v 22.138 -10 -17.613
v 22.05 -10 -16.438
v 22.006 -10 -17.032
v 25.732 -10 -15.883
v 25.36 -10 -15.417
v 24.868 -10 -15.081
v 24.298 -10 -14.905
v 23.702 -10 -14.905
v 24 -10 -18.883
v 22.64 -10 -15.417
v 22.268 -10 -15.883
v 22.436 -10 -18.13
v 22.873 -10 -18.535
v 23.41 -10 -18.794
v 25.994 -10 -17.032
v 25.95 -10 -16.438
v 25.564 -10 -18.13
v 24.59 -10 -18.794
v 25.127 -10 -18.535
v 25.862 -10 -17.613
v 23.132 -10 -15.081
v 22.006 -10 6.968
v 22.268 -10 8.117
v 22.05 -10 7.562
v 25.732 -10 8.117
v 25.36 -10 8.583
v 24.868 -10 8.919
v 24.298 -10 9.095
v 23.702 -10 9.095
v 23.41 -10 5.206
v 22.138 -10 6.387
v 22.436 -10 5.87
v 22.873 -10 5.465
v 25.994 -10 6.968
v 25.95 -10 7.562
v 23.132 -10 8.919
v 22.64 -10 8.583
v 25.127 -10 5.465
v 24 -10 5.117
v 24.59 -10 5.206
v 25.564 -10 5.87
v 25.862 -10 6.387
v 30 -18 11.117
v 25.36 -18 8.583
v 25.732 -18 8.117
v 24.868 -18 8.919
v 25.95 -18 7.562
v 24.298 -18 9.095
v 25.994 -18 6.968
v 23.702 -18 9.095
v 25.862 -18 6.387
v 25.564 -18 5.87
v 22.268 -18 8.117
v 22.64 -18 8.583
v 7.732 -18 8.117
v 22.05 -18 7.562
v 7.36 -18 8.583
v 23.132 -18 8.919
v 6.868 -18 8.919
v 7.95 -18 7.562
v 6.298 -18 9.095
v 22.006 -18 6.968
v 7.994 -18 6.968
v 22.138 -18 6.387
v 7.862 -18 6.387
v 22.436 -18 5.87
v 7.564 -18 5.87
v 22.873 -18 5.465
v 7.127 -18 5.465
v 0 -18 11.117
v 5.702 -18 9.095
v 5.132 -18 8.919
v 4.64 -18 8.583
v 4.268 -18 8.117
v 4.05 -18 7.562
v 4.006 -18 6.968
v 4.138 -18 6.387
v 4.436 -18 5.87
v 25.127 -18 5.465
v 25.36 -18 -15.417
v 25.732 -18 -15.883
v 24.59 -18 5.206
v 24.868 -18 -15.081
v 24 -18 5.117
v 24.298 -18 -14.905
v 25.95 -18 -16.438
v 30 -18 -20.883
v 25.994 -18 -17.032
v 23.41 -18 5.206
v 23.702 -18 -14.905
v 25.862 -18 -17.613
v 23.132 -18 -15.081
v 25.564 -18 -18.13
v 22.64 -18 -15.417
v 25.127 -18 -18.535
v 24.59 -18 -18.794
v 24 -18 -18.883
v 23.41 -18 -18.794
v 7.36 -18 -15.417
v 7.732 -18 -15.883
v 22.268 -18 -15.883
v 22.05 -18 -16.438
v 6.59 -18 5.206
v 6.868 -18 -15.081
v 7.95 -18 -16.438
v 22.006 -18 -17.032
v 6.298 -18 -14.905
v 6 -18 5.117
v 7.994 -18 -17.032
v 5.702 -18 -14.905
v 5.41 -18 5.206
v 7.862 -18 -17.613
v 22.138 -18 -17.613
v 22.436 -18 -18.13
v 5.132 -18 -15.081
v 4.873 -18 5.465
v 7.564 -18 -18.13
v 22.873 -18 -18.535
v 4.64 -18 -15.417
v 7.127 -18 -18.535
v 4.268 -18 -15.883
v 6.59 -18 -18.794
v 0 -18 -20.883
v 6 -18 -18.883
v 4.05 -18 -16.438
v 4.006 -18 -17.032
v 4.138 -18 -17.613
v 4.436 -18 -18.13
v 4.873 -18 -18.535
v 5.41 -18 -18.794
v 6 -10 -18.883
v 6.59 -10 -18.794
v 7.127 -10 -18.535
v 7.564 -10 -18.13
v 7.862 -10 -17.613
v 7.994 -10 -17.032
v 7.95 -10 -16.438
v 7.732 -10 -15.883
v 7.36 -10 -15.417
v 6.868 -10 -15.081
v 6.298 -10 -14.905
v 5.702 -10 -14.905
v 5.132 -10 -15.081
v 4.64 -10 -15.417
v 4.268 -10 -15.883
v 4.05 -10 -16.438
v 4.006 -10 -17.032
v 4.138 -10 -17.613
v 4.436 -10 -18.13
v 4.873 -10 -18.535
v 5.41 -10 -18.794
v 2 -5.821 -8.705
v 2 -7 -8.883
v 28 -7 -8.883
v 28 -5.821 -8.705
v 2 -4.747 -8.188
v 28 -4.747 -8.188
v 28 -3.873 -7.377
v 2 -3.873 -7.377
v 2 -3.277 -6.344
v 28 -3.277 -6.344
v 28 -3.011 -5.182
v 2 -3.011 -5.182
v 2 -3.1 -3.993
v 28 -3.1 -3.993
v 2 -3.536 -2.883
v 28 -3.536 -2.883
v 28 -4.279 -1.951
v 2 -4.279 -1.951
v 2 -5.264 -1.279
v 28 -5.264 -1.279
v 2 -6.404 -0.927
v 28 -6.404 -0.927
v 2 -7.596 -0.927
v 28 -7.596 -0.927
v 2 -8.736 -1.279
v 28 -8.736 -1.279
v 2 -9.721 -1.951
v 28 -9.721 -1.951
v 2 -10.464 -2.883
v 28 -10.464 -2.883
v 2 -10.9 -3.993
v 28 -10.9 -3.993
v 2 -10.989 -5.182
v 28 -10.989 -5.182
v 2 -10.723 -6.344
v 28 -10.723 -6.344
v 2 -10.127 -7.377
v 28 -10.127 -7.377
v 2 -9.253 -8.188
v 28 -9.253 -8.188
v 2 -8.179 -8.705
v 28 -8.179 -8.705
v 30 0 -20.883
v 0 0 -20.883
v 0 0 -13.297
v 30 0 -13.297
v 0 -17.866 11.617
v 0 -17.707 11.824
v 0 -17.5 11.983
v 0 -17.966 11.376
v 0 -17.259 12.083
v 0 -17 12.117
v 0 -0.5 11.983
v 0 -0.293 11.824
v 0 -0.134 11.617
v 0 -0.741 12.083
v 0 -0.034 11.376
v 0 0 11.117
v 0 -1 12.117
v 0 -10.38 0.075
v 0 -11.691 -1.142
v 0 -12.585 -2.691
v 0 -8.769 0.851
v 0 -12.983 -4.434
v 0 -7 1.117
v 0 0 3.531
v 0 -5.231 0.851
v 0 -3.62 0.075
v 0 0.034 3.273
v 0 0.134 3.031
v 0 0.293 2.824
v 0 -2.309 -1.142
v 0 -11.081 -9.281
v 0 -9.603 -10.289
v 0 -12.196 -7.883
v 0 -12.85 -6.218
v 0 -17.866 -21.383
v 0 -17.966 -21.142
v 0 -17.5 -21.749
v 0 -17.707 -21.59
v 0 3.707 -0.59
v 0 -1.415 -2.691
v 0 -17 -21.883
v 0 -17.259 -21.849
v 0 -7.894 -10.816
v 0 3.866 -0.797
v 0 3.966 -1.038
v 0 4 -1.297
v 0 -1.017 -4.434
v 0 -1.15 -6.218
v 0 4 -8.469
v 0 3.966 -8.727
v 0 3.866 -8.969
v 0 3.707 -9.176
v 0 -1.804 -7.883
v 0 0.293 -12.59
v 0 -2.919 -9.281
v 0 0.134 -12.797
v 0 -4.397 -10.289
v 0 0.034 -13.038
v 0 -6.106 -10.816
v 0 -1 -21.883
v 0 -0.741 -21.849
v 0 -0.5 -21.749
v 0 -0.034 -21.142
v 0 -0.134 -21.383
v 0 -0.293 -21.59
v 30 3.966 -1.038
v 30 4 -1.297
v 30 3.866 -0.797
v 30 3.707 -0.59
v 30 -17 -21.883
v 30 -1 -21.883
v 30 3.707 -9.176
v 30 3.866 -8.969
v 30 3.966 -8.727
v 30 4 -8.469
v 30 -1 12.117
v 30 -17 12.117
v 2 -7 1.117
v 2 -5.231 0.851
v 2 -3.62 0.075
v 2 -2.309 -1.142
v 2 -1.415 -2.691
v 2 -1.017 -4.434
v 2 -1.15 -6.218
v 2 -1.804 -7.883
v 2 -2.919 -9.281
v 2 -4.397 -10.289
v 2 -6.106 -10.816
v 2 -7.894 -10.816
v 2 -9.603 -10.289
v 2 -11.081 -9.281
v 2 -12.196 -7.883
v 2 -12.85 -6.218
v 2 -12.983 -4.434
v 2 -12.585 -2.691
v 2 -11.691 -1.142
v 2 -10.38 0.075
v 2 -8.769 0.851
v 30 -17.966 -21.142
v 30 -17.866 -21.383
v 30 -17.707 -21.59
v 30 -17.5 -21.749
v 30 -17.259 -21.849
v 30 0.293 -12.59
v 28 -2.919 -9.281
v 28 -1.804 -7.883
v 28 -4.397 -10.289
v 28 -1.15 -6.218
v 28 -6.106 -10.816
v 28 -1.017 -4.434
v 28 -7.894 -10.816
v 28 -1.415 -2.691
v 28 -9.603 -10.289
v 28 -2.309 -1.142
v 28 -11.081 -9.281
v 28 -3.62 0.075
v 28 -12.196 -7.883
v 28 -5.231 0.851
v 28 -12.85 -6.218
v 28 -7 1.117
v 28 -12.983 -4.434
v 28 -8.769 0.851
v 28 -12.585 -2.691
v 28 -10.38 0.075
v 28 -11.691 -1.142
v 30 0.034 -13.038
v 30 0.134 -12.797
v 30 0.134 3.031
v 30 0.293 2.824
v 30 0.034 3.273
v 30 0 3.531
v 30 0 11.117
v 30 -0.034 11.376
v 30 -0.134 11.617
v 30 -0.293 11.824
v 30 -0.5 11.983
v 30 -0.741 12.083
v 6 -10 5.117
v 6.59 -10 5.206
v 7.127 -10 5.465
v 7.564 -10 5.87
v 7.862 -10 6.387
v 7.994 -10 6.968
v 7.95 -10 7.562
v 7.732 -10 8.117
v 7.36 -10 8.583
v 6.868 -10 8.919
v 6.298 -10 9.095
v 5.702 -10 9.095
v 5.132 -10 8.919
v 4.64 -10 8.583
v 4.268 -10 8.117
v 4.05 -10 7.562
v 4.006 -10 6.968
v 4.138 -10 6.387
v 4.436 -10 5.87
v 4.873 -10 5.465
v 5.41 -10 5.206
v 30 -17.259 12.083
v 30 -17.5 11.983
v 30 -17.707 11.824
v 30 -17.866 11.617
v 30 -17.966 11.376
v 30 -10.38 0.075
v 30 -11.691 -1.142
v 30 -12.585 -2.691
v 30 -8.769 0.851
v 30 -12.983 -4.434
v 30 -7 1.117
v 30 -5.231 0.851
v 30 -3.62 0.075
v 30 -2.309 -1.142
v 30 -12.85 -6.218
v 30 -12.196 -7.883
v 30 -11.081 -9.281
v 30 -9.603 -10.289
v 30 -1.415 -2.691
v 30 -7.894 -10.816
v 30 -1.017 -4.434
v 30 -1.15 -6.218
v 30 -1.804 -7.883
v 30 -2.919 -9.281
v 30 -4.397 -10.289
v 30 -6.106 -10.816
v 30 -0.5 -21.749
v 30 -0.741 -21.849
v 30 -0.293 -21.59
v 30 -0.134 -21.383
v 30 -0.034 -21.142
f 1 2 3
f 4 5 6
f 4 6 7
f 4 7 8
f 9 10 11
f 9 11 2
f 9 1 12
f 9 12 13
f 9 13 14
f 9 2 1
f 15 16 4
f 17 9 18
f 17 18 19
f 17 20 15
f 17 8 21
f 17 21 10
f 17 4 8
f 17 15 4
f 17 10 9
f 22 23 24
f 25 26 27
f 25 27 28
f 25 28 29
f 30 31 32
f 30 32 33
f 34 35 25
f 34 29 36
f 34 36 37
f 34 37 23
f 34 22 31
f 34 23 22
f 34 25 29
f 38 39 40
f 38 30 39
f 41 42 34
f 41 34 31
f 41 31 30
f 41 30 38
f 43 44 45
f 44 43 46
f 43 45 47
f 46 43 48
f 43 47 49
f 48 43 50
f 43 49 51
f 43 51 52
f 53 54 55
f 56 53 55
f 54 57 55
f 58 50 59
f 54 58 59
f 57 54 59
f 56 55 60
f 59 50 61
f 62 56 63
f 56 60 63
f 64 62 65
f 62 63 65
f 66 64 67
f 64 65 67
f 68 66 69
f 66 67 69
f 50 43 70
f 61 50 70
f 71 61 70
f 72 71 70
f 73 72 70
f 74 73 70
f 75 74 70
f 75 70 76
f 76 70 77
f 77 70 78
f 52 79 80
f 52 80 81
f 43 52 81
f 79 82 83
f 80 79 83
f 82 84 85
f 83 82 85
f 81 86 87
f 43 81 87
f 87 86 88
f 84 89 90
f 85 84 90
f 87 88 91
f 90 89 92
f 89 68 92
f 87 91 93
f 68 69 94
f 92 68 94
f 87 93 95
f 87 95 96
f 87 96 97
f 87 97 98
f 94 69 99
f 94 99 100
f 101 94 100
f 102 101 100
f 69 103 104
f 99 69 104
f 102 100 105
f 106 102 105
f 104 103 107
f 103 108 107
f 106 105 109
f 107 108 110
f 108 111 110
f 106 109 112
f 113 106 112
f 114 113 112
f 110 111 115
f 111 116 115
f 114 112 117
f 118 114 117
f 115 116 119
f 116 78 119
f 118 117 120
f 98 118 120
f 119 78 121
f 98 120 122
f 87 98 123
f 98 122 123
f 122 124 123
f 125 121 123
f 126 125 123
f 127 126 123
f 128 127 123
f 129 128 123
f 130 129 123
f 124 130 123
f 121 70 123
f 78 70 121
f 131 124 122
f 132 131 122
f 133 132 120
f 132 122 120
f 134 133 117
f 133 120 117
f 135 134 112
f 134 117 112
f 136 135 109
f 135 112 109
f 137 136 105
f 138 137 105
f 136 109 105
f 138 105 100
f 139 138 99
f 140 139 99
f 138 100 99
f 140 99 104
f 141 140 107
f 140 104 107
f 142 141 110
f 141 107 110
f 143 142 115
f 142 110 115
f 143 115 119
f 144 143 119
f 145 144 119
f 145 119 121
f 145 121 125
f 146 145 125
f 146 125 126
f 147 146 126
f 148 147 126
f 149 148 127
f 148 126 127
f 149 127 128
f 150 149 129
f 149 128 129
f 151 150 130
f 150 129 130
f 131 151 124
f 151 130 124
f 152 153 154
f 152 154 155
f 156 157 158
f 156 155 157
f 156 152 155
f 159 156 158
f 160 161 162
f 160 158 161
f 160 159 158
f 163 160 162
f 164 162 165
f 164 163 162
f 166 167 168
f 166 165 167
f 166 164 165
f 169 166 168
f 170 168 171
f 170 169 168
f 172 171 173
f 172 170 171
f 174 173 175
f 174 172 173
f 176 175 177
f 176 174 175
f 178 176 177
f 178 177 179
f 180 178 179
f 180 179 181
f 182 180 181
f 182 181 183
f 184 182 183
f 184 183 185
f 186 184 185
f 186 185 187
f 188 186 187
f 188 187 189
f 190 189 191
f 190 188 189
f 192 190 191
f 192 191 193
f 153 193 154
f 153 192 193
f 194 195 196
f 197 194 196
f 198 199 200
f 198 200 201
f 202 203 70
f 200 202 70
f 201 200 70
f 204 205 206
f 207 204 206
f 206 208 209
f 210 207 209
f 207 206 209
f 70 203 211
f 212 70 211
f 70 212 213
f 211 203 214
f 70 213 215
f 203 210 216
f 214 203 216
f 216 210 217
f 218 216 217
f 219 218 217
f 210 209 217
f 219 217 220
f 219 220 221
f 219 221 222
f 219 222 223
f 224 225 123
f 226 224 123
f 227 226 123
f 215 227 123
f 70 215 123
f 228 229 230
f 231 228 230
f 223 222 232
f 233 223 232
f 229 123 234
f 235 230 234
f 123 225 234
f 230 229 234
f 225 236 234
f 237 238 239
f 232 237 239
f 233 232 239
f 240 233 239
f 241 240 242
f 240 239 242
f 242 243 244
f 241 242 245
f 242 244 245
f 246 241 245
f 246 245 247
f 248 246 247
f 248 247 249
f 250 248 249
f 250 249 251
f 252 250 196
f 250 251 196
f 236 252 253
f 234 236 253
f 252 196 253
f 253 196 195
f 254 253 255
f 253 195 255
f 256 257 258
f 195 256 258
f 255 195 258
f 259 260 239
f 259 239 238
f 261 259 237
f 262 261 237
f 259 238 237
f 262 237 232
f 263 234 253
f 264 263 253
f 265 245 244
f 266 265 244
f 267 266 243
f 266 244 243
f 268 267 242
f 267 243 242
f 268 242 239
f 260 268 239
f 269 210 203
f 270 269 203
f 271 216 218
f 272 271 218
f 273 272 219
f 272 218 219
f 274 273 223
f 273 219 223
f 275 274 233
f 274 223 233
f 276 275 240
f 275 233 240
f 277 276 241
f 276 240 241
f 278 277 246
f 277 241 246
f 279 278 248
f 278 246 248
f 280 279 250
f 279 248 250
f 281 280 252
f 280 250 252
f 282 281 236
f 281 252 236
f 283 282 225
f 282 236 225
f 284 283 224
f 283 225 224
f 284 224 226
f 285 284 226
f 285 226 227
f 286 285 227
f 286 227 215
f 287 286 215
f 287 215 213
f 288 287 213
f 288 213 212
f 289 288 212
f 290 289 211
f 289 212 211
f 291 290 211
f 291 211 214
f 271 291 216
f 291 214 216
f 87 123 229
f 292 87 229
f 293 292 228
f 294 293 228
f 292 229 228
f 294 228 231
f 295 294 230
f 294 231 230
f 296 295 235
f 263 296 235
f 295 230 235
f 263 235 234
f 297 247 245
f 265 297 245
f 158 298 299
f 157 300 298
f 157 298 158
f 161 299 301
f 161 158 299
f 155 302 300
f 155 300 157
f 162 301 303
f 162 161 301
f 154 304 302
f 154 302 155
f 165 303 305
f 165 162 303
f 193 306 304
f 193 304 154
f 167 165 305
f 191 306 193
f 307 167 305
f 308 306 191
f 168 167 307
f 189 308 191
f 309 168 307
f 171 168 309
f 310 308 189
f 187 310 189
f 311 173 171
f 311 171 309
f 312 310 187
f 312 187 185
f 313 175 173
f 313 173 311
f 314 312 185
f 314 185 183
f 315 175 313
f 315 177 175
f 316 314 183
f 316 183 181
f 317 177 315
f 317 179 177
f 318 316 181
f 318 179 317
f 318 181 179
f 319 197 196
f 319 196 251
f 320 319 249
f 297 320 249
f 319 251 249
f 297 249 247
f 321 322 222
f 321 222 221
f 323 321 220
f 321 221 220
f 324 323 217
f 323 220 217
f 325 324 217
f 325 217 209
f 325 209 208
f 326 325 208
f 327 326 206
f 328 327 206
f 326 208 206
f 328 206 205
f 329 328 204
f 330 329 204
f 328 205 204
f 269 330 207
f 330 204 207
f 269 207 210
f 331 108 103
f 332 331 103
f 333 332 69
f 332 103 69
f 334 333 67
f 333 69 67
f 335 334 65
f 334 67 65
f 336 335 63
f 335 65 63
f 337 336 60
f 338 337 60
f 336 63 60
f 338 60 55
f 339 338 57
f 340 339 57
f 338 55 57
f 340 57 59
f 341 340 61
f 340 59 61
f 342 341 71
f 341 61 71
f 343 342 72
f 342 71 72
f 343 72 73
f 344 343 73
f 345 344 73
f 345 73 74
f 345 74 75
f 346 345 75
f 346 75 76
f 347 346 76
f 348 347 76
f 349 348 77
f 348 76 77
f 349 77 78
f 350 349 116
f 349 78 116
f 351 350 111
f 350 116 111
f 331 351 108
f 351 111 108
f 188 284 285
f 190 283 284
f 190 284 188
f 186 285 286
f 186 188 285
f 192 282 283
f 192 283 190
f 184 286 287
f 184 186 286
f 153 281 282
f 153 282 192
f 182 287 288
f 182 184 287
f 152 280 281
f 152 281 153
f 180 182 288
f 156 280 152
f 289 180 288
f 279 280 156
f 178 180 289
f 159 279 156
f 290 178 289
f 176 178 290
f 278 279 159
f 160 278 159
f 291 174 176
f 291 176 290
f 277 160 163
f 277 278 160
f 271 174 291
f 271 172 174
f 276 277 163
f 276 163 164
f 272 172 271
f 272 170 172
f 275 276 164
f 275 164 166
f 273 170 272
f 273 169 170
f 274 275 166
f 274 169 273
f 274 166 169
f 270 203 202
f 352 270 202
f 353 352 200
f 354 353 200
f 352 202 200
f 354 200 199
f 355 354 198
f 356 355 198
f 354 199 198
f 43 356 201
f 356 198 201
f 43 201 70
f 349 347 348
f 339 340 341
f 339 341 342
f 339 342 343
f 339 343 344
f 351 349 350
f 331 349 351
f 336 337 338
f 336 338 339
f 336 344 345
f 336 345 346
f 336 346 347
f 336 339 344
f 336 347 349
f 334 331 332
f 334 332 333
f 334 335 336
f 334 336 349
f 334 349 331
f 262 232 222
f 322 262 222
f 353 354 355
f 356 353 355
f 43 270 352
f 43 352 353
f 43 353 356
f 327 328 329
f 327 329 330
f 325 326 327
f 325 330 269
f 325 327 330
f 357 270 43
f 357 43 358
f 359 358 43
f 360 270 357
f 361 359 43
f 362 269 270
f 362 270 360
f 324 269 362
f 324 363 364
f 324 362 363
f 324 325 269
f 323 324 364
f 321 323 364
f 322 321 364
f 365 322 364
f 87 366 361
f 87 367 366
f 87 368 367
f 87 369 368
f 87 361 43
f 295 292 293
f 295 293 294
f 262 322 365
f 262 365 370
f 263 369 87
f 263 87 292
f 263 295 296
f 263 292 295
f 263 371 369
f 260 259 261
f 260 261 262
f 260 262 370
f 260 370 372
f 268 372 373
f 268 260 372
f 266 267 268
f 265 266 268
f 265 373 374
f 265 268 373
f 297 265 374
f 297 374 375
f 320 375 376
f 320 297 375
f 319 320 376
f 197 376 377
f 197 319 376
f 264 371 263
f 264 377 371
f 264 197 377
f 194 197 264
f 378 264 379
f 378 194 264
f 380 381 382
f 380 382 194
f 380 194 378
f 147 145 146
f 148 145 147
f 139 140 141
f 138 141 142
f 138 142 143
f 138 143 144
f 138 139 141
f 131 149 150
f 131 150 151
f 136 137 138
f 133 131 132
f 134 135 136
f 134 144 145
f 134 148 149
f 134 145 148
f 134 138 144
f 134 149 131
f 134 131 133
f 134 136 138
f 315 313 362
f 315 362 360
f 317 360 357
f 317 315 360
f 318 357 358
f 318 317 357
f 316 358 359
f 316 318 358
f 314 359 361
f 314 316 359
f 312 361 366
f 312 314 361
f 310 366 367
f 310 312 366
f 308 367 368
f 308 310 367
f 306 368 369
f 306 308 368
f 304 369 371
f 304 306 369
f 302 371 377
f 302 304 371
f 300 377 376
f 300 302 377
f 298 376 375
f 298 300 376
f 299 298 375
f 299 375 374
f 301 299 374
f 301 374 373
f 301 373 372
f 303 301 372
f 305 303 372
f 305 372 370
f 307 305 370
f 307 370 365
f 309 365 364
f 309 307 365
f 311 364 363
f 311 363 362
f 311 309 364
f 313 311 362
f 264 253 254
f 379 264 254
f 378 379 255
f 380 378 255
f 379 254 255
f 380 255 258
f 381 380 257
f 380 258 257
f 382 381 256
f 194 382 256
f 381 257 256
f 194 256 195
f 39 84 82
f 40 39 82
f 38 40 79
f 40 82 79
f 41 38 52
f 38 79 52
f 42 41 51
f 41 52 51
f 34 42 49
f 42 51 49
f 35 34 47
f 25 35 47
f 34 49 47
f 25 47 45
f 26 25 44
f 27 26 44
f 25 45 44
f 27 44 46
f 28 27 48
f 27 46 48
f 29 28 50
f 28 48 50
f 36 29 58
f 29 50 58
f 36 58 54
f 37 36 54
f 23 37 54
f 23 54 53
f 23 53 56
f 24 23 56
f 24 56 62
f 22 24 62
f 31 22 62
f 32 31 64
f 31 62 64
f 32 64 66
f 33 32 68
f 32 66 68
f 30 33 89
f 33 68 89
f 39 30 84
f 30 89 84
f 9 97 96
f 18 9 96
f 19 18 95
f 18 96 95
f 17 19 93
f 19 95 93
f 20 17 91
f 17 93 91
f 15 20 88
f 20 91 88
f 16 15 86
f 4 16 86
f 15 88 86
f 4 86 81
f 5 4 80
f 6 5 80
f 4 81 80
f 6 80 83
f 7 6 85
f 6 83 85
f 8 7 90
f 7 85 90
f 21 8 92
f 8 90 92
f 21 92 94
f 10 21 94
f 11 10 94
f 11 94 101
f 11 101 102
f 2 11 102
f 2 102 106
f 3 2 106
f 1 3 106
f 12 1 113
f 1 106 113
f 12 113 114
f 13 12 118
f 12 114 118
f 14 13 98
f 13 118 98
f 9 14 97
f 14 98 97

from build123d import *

# Parameters (mm, degrees)
SKETCH_1_R          = 4
EXTRUDE_1_DEPTH     = 30
SKETCH_6_R          = 2
CUT_EXTRUDE_5_DEPTH = 8
SKETCH_7_R          = 6
CUT_EXTRUDE_6_DEPTH = 2
CUT_EXTRUDE_START   = -2
SKETCH_8_R          = 6
CUT_EXTRUDE_7_DEPTH = 2


with BuildPart() as part:
    # 草图1 → 凸台-拉伸1 (new body)
    with BuildSketch(Plane(origin=(0, 0, 0), x_dir=(0, 0, -1), z_dir=(1, 0, 0))):
        with BuildLine():
            Line((-12.117188, -1), (-12.117188, -17))
            ThreePointArc((-12.117188, -17), (-11.824294782, -17.707106781), (-11.117188, -18))
            Line((-11.117188, -18), (20.882812, -18))
            ThreePointArc((20.882812, -18), (21.589918781, -17.707106781), (21.882812, -17))
            Line((21.882812, -17), (21.882812, -1))
            ThreePointArc((21.882812, -1), (21.589918781, -0.292893219), (20.882812, 0))
            Line((20.882812, 0), (13.297025562, 0))
            ThreePointArc((13.297025562, 0), (12.91434213, 0.076120467), (12.589918781, 0.292893219))
            Line((12.589918781, 0.292893219), (9.175705218, 3.707106781))
            ThreePointArc((9.175705218, 3.707106781), (8.85128187, 3.923879533), (8.468598437, 4))
            Line((8.468598437, 4), (1.297025562, 4))
            ThreePointArc((1.297025562, 4), (0.91434213, 3.923879533), (0.589918781, 3.707106781))
            Line((0.589918781, 3.707106781), (-2.824294782, 0.292893219))
            ThreePointArc((-2.824294782, 0.292893219), (-3.14871813, 0.076120467), (-3.531401563, 0))
            Line((-3.531401563, 0), (-11.117188, 0))
            ThreePointArc((-11.117188, 0), (-11.824294782, -0.292893219), (-12.117188, -1))
        make_face()
        with Locations((4.882812, -7)):
            Circle(SKETCH_1_R, mode=Mode.SUBTRACT)
    extrude(amount=EXTRUDE_1_DEPTH)

    # 草图6 → 切除-拉伸5 (cut)
    with BuildSketch(Plane.XZ.offset(18)):
        with Locations(Location((24, -16.882812, 0), (0, 0, 270))):
            Circle(SKETCH_6_R)
        with Locations(Location((6, -16.882812, 0), (0, 0, 270))):
            Circle(SKETCH_6_R)
        with Locations(Location((6, 7.117188, 0), (0, 0, 270))):
            Circle(SKETCH_6_R)
        with Locations(Location((24, 7.117188, 0), (0, 0, 270))):
            Circle(SKETCH_6_R)
    extrude(amount=-CUT_EXTRUDE_5_DEPTH, mode=Mode.SUBTRACT)

    # 草图7 → 切除-拉伸6 (cut)
    with BuildSketch(Plane.ZY):
        with Locations((-4.882812, -7)):
            Circle(SKETCH_7_R)
    extrude(amount=-CUT_EXTRUDE_6_DEPTH, mode=Mode.SUBTRACT)

    # 草图8 → 切除-拉伸7 (cut)
    with BuildSketch(Plane(origin=(30, 0, 0), x_dir=(0, 0, -1), z_dir=(1, 0, 0)).offset(CUT_EXTRUDE_START)):
        with Locations(Location((4.882812, -7, 0), (0, 0, 180))):
            Circle(SKETCH_8_R)
    extrude(amount=CUT_EXTRUDE_7_DEPTH, mode=Mode.SUBTRACT)


solid = part.part
